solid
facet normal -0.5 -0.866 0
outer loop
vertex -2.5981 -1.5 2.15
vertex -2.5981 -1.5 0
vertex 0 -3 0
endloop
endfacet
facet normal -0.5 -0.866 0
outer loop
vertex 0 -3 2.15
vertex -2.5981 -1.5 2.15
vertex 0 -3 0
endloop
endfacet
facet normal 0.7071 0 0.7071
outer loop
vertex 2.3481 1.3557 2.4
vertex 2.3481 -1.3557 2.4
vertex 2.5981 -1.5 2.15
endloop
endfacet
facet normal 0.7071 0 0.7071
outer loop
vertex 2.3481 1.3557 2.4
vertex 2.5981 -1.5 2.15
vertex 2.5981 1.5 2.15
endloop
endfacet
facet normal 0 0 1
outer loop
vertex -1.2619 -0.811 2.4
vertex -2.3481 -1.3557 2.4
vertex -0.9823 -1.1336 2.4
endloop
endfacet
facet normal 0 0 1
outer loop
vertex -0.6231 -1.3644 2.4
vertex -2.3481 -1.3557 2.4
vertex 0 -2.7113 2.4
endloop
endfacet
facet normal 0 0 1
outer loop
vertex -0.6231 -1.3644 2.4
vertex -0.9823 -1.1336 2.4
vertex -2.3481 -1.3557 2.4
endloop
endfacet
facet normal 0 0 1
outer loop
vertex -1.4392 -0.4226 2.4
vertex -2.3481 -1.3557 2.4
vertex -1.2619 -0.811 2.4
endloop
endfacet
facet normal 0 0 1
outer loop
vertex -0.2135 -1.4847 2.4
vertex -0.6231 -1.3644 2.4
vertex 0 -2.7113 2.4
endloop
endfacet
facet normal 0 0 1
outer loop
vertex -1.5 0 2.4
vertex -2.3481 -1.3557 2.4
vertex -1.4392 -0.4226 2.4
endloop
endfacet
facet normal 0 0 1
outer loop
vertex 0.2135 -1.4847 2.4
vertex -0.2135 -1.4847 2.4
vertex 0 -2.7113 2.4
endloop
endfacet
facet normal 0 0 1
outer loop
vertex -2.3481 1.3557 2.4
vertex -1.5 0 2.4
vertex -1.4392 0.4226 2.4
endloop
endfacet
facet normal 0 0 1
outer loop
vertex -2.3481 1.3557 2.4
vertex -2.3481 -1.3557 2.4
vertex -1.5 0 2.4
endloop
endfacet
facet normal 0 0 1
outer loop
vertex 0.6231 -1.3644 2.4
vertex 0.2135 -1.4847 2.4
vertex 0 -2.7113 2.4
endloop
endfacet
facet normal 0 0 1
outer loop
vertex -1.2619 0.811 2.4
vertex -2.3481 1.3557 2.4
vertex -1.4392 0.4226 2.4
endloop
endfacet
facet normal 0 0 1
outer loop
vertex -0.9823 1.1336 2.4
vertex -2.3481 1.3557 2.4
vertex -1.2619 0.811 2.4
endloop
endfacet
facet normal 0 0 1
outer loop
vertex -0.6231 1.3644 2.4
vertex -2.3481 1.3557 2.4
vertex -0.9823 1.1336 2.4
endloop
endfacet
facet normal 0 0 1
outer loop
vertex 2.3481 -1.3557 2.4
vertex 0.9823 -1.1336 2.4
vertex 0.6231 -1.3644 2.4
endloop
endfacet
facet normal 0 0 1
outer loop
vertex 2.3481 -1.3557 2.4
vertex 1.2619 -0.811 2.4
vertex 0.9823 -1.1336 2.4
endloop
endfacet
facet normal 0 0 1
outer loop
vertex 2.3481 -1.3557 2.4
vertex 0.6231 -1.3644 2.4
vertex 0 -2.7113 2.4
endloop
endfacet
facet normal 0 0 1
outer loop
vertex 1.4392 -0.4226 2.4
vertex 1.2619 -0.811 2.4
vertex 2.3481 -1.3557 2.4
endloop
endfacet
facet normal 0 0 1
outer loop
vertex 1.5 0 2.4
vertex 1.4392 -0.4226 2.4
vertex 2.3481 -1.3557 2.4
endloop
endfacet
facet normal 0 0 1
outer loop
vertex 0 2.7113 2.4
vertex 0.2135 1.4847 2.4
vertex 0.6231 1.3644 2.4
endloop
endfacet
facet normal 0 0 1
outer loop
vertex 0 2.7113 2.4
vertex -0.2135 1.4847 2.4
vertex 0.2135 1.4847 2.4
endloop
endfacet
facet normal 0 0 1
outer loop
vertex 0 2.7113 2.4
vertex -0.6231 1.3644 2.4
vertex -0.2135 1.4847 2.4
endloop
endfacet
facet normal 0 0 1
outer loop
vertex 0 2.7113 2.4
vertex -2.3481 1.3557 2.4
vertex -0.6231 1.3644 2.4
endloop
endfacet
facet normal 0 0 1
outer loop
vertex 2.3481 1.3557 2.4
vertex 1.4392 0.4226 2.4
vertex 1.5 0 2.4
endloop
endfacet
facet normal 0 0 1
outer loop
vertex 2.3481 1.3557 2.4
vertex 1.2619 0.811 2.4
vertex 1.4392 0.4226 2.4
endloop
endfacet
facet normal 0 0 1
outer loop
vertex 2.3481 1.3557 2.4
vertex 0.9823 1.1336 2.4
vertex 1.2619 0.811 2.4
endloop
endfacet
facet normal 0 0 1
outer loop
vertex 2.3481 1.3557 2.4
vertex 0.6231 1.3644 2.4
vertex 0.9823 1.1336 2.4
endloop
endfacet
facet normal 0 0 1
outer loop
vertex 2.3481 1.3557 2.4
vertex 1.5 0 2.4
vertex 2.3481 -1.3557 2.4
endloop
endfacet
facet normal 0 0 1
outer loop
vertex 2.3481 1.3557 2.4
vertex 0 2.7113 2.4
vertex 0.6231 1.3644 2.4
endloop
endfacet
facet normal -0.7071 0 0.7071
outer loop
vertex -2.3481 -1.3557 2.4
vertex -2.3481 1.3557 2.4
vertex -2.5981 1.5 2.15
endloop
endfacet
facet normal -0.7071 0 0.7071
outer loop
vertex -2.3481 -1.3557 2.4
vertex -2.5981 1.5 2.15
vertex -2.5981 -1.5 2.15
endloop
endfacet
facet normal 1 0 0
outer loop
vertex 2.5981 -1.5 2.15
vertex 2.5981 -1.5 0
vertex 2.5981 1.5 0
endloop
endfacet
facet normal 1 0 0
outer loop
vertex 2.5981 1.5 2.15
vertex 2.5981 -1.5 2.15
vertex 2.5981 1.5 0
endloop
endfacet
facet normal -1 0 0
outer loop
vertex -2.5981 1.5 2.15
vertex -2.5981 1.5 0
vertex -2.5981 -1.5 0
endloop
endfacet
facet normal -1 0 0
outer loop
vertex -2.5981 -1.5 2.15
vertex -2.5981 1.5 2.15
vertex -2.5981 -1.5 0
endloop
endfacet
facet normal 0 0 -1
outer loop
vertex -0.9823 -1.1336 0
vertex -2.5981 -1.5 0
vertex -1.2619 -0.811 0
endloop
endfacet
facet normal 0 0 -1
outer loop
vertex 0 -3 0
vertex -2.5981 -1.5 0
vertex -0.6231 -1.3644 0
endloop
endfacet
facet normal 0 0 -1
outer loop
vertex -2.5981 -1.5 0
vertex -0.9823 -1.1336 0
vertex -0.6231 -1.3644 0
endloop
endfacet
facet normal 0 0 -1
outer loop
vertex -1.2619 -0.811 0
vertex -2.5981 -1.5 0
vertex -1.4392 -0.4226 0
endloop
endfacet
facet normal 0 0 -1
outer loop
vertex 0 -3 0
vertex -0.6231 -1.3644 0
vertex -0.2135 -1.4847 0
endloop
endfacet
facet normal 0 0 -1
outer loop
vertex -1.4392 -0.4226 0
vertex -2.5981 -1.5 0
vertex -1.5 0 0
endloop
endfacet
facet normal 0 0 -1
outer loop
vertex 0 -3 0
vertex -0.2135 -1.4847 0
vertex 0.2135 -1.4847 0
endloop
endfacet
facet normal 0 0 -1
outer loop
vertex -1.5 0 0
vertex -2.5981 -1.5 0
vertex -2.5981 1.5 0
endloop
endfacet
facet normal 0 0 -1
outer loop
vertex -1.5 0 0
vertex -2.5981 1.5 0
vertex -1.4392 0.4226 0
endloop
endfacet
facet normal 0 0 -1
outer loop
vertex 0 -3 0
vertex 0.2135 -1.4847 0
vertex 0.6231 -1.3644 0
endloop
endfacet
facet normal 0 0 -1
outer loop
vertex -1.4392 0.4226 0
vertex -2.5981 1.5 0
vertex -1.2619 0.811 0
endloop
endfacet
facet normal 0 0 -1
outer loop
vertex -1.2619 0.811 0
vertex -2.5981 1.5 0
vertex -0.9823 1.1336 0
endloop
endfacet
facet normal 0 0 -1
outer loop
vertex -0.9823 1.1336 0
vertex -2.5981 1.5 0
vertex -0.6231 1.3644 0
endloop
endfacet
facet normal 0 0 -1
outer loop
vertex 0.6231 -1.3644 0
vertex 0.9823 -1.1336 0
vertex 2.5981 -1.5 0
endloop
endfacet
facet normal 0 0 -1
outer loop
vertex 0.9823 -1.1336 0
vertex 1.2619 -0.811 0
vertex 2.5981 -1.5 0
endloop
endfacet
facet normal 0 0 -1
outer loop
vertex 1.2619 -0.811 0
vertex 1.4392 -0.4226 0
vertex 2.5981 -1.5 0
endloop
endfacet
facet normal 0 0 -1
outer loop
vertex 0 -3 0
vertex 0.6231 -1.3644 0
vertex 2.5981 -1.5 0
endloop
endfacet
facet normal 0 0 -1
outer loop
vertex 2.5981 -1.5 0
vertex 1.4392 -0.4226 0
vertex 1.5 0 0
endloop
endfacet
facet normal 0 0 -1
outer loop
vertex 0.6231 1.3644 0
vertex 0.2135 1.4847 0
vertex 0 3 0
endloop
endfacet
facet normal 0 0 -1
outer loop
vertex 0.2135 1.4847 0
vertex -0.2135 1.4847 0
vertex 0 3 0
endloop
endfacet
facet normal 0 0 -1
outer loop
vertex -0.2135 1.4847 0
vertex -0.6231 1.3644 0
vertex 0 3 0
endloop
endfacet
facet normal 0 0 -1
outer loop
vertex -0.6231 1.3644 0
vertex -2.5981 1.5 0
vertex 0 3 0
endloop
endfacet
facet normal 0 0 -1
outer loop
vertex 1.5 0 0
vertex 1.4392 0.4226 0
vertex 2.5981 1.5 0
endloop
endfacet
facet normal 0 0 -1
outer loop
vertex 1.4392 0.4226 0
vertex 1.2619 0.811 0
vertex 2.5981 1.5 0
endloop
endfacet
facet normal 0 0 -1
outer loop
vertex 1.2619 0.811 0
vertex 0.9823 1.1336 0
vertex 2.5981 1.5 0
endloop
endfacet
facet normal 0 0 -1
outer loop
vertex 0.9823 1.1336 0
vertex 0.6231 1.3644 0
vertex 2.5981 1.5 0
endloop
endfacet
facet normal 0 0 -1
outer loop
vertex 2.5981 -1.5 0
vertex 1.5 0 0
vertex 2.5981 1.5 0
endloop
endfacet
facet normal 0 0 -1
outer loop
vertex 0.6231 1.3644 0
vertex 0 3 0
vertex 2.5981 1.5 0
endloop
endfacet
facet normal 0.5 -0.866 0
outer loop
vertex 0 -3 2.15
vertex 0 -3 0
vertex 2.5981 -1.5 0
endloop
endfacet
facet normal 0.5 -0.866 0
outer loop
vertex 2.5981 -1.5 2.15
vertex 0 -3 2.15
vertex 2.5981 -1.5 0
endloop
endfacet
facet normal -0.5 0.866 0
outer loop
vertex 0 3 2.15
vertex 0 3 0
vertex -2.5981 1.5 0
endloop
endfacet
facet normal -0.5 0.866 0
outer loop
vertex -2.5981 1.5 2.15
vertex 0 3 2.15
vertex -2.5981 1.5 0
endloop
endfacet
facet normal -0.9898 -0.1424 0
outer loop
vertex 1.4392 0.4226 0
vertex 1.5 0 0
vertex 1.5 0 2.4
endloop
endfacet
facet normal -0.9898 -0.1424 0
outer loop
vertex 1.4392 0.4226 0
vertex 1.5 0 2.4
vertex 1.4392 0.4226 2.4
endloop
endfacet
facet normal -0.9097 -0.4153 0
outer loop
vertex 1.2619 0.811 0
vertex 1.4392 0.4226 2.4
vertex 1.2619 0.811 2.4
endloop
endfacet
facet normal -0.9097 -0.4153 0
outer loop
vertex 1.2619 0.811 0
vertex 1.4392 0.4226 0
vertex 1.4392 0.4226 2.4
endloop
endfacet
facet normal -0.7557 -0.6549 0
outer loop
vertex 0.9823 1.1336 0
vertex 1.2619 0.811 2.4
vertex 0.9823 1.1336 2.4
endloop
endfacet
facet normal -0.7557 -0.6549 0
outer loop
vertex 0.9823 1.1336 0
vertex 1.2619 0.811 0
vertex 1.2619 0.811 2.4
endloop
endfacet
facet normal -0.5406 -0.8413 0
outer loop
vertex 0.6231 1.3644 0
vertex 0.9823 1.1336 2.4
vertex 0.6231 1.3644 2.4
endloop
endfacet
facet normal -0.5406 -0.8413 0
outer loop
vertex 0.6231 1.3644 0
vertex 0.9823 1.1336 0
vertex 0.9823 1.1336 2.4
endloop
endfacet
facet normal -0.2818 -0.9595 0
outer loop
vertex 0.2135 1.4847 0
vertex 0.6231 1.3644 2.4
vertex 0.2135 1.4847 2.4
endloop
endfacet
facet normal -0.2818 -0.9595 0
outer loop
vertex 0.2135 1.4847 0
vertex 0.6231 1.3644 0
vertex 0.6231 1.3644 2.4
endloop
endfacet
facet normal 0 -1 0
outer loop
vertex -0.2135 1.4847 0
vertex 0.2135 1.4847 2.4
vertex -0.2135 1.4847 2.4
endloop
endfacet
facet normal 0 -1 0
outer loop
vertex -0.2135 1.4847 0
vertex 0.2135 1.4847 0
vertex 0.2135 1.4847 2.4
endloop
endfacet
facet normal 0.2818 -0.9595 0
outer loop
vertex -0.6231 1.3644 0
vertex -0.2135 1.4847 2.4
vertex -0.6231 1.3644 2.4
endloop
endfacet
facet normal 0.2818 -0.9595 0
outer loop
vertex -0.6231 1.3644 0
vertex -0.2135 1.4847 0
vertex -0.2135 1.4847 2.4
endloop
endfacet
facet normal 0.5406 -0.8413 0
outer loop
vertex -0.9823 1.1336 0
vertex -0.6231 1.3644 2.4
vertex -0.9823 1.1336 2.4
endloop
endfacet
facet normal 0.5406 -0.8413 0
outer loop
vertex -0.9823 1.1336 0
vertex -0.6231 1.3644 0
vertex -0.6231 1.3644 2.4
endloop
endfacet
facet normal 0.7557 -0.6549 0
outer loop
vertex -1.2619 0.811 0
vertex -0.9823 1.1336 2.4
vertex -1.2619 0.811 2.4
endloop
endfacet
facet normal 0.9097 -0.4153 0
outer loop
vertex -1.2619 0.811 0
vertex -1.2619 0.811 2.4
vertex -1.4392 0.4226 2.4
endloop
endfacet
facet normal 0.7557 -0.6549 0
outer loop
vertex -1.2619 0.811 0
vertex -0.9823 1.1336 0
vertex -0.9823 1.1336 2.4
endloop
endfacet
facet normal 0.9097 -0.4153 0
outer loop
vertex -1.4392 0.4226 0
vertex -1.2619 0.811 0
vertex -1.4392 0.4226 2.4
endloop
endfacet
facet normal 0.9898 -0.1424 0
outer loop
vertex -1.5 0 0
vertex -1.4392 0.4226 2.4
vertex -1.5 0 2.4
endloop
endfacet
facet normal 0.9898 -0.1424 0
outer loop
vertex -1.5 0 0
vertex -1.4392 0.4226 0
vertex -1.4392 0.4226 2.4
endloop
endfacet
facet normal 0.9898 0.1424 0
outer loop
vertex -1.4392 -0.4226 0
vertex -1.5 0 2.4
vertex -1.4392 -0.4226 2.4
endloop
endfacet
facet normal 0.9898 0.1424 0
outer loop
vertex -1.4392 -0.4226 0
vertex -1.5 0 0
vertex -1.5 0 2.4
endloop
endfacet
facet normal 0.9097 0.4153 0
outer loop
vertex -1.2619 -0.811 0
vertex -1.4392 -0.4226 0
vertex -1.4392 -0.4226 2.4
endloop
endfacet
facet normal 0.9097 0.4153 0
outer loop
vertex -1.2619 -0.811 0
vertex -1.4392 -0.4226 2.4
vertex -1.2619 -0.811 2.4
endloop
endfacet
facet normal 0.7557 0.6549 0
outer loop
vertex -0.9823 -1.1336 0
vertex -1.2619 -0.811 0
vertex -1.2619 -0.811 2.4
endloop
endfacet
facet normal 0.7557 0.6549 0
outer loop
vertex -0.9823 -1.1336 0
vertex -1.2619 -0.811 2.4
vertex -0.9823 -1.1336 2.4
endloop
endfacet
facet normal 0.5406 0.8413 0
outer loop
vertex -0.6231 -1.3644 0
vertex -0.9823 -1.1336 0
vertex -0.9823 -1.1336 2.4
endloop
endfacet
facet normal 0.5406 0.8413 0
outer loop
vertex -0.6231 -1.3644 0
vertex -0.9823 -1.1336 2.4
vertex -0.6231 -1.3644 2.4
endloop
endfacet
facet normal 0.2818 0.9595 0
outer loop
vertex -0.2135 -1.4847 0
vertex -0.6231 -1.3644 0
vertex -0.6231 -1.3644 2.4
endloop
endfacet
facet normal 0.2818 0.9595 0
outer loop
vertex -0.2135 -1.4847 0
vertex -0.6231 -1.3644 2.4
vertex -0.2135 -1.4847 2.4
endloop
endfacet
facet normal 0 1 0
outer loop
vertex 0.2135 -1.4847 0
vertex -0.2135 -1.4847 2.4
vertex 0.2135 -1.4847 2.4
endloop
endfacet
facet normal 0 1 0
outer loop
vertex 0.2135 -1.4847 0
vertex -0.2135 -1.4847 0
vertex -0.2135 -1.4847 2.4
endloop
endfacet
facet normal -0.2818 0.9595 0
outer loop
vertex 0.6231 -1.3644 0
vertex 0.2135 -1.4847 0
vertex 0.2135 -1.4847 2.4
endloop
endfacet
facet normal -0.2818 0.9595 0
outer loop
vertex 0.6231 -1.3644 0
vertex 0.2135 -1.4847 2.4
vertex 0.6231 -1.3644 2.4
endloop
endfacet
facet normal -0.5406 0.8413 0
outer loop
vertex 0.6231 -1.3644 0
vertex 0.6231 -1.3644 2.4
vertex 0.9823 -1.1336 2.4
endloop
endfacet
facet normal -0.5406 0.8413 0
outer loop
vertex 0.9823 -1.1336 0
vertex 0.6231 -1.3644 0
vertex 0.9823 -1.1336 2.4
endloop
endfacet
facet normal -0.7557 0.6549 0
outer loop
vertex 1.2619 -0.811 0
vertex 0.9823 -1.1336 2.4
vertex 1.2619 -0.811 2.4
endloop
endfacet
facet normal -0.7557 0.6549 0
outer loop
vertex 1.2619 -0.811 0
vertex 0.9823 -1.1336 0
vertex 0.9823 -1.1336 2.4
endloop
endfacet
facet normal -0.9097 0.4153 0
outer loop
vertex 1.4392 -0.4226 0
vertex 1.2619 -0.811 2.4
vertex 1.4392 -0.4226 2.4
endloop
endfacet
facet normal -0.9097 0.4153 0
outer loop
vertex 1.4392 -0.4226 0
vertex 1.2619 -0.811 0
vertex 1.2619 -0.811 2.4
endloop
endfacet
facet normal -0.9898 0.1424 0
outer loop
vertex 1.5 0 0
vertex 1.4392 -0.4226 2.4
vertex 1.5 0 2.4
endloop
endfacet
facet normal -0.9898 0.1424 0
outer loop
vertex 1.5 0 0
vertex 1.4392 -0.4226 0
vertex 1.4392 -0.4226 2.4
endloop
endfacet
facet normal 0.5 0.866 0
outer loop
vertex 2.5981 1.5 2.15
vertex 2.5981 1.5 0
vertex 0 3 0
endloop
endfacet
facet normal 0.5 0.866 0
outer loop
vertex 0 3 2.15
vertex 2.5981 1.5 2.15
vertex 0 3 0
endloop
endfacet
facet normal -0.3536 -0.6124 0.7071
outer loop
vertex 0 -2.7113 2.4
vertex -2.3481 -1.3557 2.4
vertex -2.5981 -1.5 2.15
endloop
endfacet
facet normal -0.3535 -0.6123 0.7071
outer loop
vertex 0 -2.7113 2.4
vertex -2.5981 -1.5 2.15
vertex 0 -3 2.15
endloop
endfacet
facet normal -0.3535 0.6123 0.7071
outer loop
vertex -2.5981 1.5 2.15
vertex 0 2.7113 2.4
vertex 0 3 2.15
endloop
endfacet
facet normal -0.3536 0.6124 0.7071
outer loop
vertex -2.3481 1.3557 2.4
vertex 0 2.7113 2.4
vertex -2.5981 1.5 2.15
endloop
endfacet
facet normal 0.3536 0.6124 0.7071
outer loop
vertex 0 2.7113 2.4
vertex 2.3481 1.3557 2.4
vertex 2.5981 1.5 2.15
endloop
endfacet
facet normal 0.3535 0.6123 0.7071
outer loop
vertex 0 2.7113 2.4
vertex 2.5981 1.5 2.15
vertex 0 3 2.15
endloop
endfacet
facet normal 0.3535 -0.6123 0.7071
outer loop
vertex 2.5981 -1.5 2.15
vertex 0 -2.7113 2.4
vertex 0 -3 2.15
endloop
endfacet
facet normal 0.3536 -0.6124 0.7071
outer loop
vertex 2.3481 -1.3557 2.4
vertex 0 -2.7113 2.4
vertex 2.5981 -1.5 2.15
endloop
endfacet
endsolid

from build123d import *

# Parameters (mm, degrees)
ESQUISSE1_R        = 1.5
BOSS_EXTRU_1_DEPTH = 2.4
CHANFREIN1_SIZE    = 0.25


with BuildPart() as part:
    # Esquisse1 → Boss.-Extru.1 (new body)
    with BuildSketch(Plane.XY):
        Polygon((0, -3), (2.598076211, -1.5), (2.598076211, 1.5), (0, 3), (-2.598076211, 1.5), (-2.598076211, -1.5), align=None)
        Circle(ESQUISSE1_R, mode=Mode.SUBTRACT)
    extrude(amount=BOSS_EXTRU_1_DEPTH)

    # Chanfrein1
    chanfrein1_edges = [part.edges().sort_by_distance(p)[0] for p in [
        (2.598076211, 0, 2.4),
        (1.299038106, 2.25, 2.4),
        (-1.299038106, 2.25, 2.4),
        (-2.598076211, 0, 2.4),
        (-1.299038106, -2.25, 2.4),
        (1.299038106, -2.25, 2.4),
    ]]
    chamfer(chanfrein1_edges, length=CHANFREIN1_SIZE)


solid = part.part
